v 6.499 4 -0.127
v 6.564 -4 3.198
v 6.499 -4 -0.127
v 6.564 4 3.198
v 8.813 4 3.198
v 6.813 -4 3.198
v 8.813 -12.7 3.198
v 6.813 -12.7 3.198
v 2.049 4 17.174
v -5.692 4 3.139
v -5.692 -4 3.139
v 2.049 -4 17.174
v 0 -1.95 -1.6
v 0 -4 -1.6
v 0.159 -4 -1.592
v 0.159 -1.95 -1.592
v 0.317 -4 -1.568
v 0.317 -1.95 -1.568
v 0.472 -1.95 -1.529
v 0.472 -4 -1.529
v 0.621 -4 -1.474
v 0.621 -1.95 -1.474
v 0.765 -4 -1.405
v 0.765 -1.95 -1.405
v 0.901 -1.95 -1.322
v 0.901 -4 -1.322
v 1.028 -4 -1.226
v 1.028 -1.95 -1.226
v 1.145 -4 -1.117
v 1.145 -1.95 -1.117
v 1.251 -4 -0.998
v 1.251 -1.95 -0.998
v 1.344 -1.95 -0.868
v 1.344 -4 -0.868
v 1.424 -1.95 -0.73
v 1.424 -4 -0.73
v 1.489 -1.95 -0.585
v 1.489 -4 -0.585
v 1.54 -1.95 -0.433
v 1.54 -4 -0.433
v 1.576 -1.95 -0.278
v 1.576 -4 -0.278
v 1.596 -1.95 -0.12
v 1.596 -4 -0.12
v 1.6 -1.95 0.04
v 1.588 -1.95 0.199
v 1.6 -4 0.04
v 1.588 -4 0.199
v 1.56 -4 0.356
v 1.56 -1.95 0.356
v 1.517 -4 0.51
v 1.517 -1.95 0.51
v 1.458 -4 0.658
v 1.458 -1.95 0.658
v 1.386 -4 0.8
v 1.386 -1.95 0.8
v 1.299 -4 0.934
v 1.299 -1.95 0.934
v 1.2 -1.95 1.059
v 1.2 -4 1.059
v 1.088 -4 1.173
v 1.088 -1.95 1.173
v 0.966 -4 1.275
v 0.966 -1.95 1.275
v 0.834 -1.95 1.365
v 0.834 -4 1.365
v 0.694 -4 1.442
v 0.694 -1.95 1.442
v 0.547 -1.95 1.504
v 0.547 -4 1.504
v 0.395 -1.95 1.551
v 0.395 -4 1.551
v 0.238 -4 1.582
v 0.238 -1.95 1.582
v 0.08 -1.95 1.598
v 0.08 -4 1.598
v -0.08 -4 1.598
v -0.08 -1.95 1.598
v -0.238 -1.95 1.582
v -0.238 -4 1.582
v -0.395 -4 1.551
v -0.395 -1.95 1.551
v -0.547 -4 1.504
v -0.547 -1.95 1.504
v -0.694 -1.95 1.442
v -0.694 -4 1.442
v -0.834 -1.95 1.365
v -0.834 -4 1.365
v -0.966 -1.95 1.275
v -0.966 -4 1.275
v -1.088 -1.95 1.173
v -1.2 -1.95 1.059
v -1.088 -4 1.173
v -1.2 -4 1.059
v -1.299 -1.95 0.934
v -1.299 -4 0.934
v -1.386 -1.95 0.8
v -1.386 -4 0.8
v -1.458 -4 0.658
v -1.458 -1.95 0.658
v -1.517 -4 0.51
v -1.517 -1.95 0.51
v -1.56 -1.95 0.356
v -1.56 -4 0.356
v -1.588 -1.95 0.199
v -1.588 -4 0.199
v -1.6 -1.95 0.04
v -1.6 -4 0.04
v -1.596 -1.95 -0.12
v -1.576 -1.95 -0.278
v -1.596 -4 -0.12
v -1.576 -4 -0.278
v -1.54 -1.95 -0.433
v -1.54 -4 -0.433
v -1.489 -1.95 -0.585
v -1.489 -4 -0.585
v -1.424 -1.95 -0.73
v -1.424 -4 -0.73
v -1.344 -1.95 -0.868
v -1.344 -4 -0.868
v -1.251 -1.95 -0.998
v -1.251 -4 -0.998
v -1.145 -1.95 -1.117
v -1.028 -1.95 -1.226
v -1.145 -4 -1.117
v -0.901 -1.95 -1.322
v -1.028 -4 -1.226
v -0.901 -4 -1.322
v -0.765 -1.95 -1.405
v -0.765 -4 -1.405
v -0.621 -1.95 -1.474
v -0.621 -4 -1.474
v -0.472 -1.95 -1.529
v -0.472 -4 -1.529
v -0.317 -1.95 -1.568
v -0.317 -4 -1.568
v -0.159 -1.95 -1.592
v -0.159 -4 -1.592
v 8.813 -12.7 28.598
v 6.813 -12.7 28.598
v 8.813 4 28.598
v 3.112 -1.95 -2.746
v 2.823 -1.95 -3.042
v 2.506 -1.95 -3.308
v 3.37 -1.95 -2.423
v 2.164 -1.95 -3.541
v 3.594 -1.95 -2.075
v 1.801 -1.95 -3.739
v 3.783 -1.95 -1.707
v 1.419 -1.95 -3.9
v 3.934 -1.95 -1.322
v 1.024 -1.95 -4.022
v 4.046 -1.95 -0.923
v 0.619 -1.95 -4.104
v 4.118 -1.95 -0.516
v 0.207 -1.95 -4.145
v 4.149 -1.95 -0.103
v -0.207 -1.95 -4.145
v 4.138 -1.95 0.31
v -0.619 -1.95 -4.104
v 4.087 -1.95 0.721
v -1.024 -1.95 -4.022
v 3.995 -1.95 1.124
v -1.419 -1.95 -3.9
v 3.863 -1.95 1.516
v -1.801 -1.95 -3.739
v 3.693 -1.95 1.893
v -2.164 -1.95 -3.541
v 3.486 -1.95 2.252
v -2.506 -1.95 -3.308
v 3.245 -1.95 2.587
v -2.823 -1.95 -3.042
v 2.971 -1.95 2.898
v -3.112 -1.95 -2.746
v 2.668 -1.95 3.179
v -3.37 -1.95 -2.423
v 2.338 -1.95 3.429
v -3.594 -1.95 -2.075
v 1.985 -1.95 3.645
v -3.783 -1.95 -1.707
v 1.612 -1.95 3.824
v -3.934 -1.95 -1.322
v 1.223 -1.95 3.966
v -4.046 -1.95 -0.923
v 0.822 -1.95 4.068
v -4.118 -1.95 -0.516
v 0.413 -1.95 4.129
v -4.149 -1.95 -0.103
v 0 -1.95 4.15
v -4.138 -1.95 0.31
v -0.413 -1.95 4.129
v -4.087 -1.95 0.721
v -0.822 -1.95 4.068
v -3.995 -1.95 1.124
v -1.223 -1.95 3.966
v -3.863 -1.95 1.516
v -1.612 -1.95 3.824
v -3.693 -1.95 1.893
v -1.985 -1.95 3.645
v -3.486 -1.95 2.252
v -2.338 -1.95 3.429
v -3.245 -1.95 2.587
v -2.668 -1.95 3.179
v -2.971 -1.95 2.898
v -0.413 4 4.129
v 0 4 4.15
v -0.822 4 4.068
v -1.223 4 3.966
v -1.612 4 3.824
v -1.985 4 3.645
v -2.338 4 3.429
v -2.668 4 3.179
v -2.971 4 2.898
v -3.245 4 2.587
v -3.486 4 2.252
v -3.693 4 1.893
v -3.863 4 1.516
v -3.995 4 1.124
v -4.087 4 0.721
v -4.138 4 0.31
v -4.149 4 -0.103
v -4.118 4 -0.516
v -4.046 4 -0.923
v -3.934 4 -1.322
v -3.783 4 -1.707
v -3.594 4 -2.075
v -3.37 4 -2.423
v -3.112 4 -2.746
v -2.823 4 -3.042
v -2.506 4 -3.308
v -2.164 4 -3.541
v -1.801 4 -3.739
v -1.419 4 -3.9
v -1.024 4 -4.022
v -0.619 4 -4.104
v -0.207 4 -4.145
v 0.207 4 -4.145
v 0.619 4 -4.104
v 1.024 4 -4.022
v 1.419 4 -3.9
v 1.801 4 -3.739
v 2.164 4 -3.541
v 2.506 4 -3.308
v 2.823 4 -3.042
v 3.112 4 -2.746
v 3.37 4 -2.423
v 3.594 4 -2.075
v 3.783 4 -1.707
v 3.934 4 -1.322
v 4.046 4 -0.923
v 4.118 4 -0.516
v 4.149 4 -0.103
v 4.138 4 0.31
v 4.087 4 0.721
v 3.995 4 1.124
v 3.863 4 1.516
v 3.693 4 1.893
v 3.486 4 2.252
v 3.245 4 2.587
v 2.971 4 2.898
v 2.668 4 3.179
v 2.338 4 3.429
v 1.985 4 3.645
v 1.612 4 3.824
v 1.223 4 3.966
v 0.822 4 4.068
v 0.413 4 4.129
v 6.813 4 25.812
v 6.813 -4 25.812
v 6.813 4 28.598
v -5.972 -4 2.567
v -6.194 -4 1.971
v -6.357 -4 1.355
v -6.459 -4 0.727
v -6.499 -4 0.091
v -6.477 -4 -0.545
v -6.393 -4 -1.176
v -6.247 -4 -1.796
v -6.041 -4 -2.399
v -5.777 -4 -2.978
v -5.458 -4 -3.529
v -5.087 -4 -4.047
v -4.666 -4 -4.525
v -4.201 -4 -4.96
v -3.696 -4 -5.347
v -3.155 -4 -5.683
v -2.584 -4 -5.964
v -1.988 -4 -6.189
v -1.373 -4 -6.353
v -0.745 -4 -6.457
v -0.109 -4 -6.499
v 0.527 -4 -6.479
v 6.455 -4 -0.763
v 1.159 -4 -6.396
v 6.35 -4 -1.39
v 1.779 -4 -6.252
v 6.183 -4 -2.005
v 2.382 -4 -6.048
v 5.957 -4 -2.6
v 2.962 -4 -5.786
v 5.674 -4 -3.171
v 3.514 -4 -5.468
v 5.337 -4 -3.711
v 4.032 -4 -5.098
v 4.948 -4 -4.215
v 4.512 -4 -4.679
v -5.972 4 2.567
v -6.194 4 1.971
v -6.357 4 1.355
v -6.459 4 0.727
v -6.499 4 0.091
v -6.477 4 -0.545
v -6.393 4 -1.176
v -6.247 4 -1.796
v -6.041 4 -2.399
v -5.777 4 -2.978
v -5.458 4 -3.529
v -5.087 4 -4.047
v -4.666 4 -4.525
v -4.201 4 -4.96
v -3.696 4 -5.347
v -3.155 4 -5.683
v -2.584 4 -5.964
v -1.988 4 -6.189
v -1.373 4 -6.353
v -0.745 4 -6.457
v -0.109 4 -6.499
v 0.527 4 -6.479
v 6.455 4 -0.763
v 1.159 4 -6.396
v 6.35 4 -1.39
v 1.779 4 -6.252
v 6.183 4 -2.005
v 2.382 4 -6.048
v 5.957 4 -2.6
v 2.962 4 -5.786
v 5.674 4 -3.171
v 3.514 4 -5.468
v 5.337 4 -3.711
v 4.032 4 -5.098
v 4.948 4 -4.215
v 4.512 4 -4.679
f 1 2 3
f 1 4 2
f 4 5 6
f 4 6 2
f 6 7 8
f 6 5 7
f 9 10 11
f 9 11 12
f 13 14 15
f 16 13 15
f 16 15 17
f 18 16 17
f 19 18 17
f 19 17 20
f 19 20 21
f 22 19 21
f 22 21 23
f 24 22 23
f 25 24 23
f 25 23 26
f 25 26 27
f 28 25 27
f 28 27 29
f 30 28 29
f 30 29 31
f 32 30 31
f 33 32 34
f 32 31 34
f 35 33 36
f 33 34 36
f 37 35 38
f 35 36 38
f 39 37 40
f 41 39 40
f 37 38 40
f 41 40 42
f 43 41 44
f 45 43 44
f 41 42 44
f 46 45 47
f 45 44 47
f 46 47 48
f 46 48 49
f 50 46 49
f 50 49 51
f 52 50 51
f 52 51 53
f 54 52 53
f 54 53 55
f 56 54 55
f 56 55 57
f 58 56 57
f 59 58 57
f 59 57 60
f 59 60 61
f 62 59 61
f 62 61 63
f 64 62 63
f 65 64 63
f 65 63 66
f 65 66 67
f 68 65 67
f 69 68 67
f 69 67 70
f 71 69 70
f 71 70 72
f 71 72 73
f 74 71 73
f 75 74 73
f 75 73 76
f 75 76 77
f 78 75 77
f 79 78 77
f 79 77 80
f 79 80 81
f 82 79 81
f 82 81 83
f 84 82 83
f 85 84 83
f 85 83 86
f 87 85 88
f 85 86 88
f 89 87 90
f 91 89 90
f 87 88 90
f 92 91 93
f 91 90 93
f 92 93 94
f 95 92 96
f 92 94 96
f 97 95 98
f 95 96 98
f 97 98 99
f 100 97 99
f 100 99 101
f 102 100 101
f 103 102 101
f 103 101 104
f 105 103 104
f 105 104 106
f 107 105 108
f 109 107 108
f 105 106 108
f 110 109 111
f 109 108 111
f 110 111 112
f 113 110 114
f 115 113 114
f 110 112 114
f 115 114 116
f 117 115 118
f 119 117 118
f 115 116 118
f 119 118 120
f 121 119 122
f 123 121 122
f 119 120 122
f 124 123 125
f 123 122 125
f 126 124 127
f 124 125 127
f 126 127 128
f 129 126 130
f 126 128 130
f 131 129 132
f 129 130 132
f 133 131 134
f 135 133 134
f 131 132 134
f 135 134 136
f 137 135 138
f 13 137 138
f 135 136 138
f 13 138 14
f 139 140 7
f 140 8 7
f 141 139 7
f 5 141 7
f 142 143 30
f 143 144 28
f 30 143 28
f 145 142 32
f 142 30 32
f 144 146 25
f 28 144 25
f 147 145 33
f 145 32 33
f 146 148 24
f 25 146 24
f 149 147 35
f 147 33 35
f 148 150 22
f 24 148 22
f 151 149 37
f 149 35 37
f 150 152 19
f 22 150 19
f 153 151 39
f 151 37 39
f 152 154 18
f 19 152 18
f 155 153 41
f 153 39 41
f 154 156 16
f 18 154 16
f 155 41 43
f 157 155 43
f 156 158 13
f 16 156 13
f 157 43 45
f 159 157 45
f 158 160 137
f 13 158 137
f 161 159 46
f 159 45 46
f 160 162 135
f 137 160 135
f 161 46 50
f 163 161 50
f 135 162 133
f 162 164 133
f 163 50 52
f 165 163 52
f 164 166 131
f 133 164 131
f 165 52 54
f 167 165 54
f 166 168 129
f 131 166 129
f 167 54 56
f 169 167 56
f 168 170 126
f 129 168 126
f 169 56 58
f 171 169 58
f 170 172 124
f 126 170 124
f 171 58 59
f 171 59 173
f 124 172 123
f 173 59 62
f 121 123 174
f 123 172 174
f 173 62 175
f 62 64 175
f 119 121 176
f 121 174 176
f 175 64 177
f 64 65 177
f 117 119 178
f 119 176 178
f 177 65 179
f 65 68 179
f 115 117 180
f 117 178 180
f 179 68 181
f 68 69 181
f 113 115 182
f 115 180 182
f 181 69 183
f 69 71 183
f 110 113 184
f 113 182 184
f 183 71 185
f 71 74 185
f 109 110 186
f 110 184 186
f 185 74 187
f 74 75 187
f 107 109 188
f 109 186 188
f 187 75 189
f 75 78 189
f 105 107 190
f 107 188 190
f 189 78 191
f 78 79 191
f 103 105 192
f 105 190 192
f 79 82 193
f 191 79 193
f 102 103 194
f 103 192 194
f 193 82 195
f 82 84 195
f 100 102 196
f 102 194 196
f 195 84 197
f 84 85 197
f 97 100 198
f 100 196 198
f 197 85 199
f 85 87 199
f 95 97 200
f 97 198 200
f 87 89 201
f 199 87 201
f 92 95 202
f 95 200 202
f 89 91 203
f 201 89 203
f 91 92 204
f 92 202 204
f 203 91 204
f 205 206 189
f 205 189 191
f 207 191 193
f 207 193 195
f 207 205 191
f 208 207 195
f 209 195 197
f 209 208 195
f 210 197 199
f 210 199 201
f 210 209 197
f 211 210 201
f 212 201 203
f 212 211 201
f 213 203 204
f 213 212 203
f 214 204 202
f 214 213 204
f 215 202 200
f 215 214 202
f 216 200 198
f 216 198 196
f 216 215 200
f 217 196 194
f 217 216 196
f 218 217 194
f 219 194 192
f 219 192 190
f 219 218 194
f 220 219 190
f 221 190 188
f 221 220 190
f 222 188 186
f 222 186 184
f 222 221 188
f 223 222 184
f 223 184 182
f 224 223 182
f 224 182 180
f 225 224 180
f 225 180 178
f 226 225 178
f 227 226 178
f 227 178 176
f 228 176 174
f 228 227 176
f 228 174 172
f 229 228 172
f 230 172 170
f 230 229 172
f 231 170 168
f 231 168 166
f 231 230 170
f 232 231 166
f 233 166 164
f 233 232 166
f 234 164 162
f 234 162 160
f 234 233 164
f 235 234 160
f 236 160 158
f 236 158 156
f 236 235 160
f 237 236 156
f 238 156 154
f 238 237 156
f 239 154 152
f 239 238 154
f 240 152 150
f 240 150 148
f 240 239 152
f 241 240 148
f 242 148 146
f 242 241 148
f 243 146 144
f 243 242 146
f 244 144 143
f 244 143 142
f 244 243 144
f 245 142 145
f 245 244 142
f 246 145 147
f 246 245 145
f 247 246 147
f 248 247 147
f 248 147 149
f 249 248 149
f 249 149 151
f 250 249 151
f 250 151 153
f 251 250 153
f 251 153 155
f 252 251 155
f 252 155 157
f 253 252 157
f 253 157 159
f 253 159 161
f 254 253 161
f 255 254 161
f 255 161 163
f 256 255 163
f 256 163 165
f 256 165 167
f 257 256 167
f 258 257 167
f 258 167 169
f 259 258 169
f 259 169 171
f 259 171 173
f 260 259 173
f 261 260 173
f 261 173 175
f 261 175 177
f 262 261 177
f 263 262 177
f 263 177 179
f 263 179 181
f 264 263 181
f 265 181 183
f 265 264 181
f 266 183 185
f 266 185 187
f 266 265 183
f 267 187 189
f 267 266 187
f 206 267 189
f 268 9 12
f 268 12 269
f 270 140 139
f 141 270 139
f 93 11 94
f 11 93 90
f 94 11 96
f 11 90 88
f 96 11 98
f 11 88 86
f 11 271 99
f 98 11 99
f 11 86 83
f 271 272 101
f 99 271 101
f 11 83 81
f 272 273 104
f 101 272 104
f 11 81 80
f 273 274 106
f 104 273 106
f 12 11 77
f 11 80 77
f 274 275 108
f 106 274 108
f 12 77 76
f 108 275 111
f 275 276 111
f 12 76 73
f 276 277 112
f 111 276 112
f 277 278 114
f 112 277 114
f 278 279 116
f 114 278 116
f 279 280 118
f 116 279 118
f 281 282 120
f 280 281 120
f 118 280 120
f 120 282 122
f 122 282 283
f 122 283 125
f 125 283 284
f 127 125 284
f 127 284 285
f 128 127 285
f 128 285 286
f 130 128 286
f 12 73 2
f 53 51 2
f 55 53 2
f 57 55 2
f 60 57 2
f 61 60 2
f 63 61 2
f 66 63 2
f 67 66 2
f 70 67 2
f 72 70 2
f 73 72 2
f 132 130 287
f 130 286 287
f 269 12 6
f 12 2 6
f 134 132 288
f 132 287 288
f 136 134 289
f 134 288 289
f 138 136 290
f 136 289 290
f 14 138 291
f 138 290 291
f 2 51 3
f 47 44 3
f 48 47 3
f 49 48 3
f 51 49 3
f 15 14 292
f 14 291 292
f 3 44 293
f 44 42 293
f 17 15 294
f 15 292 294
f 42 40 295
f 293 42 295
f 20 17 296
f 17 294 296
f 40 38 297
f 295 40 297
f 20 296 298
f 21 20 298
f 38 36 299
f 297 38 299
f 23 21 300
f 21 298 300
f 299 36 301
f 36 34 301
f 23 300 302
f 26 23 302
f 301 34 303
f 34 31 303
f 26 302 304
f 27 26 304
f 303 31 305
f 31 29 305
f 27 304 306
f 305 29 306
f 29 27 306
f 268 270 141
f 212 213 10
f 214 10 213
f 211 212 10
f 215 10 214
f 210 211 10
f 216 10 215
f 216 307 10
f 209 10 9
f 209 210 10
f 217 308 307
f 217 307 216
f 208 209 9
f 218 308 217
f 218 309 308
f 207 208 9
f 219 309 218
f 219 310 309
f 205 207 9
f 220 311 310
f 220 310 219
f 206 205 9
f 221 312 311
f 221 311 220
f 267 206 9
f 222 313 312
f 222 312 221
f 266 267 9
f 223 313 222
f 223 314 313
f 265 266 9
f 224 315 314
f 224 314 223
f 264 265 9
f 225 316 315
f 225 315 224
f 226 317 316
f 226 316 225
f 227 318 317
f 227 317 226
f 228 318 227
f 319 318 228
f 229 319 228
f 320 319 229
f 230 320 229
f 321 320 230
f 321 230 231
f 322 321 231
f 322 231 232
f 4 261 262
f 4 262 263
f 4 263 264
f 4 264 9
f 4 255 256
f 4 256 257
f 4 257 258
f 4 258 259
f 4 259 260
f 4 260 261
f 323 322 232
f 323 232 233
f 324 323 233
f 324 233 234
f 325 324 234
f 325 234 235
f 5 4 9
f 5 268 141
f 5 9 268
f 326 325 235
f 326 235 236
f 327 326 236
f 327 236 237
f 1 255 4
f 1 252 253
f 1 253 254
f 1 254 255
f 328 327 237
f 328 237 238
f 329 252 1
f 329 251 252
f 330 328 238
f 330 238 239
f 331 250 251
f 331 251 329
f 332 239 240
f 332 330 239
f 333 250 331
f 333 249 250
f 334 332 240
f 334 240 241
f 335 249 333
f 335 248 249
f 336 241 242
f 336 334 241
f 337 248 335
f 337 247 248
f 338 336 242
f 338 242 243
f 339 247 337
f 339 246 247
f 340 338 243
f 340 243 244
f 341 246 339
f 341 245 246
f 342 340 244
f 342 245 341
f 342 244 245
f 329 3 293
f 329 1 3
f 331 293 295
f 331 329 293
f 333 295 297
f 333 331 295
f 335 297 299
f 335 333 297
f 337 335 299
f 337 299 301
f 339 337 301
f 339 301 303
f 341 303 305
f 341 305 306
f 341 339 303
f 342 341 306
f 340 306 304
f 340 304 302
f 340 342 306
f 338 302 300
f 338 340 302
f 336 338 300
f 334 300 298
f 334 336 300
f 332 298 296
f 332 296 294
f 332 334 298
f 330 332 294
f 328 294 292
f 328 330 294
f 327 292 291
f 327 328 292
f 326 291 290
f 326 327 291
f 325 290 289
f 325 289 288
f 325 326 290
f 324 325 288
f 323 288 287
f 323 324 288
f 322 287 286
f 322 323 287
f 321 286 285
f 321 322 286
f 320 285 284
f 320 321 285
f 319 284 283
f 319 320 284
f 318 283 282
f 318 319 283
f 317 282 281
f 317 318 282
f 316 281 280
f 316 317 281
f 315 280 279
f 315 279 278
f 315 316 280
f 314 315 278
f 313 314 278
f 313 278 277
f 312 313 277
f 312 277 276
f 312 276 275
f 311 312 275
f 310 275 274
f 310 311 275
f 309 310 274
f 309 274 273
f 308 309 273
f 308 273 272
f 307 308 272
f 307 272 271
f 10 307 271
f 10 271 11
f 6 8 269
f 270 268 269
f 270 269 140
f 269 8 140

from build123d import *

# Parameters (mm, degrees)
BOSS_EXTRUDE1_DEPTH      = 4
BOSS_EXTRUDE2_DEPTH      = 4
BOSS_EXTRUDE2_DEPTH_BACK = 12.7
CUT_EXTRUDE1_START       = -8
SKETCH2_R                = 4.15
CUT_EXTRUDE1_DEPTH       = 5.95
SKETCH3_R                = 1.6
CUT_EXTRUDE2_DEPTH       = 32.16390509


with BuildPart() as part:
    # Sketch1 → Boss-Extrude1 (new, symmetric)
    with BuildSketch(Plane(origin=(0, 0, 0), x_dir=(1, 0, 0), z_dir=(0, 1, 0))):
        with BuildLine():
            ThreePointArc((6.498753649, 0.127283164), (-1.682323793, 6.278517871), (-5.691727336, -3.139146371))
            ThreePointArc((-5.691727336, -3.139146371), (1.620767152, -6.294689336), (6.5, 0))
            ThreePointArc((6.5, 0), (6.499688405, 0.063644633), (6.498753649, 0.127283164))
        make_face()
        with BuildLine():
            ThreePointArc((6.5, 0), (1.620767152, -6.294689336), (-5.691727336, -3.139146371))
            Line((-5.691727336, -3.139146371), (2.048950522, -17.174117205))
            ThreePointArc((2.048950522, -17.174117205), (4.906448368, -18.407206302), (6.813102435, -15.947435392))
            ThreePointArc((6.813102435, -15.947435392), (6.812980673, -15.922565028), (6.812615399, -15.897697048))
            Line((6.812615399, -15.897697048), (6.563875983, -3.197697048))
            Line((6.563875983, -3.197697048), (6.498753649, 0.127283164))
            ThreePointArc((6.498753649, 0.127283164), (6.499688405, 0.063644633), (6.5, 0))
        make_face()
        with BuildLine():
            ThreePointArc((6.812615399, -15.897697048), (6.812980673, -15.922565028), (6.813102435, -15.947435392))
            Line((6.813102435, -15.947435392), (6.813102435, -3.197697048))
            Line((6.813102435, -3.197697048), (6.563875983, -3.197697048))
            Line((6.563875983, -3.197697048), (6.812615399, -15.897697048))
        make_face()
        with BuildLine():
            ThreePointArc((6.813102435, -15.947435392), (4.906448368, -18.407206302), (2.048950522, -17.174117205))
            Line((2.048950522, -17.174117205), (6.813102435, -25.812215104))
            Line((6.813102435, -25.812215104), (6.813102435, -15.947435392))
        make_face()
    extrude(amount=BOSS_EXTRUDE1_DEPTH, both=True)

    # Sketch1<3> → Boss-Extrude2 (add, two sides: drawn at the far end of the back side and taken through both)
    with BuildSketch(Plane(origin=(0, 0, 0), x_dir=(1, 0, 0), z_dir=(0, 1, 0)).offset(-BOSS_EXTRUDE2_DEPTH_BACK)):
        Polygon((6.813102435, -15.947435392), (6.813102435, -25.812215104), (6.813102435, -28.597697048), (8.813098435, -28.597697048), (8.813098435, -3.197697048), (6.813102435, -3.197697048), align=None)
    extrude(amount=BOSS_EXTRUDE2_DEPTH + BOSS_EXTRUDE2_DEPTH_BACK)

    # Sketch2 → Cut-Extrude1 (cut)
    with BuildSketch(Plane.XZ.offset(4).offset(CUT_EXTRUDE1_START)):
        with Locations(Location((0, 0, 0), (0, 0, 90))):
            Circle(SKETCH2_R)
    extrude(amount=CUT_EXTRUDE1_DEPTH, mode=Mode.SUBTRACT)

    # Sketch3 → Cut-Extrude2 (cut, through all)
    with BuildSketch(Plane.XZ.offset(4)):
        with Locations(Location((0, 0, 0), (0, 0, 270))):
            Circle(SKETCH3_R)
    extrude(amount=-CUT_EXTRUDE2_DEPTH, mode=Mode.SUBTRACT)


solid = part.part
